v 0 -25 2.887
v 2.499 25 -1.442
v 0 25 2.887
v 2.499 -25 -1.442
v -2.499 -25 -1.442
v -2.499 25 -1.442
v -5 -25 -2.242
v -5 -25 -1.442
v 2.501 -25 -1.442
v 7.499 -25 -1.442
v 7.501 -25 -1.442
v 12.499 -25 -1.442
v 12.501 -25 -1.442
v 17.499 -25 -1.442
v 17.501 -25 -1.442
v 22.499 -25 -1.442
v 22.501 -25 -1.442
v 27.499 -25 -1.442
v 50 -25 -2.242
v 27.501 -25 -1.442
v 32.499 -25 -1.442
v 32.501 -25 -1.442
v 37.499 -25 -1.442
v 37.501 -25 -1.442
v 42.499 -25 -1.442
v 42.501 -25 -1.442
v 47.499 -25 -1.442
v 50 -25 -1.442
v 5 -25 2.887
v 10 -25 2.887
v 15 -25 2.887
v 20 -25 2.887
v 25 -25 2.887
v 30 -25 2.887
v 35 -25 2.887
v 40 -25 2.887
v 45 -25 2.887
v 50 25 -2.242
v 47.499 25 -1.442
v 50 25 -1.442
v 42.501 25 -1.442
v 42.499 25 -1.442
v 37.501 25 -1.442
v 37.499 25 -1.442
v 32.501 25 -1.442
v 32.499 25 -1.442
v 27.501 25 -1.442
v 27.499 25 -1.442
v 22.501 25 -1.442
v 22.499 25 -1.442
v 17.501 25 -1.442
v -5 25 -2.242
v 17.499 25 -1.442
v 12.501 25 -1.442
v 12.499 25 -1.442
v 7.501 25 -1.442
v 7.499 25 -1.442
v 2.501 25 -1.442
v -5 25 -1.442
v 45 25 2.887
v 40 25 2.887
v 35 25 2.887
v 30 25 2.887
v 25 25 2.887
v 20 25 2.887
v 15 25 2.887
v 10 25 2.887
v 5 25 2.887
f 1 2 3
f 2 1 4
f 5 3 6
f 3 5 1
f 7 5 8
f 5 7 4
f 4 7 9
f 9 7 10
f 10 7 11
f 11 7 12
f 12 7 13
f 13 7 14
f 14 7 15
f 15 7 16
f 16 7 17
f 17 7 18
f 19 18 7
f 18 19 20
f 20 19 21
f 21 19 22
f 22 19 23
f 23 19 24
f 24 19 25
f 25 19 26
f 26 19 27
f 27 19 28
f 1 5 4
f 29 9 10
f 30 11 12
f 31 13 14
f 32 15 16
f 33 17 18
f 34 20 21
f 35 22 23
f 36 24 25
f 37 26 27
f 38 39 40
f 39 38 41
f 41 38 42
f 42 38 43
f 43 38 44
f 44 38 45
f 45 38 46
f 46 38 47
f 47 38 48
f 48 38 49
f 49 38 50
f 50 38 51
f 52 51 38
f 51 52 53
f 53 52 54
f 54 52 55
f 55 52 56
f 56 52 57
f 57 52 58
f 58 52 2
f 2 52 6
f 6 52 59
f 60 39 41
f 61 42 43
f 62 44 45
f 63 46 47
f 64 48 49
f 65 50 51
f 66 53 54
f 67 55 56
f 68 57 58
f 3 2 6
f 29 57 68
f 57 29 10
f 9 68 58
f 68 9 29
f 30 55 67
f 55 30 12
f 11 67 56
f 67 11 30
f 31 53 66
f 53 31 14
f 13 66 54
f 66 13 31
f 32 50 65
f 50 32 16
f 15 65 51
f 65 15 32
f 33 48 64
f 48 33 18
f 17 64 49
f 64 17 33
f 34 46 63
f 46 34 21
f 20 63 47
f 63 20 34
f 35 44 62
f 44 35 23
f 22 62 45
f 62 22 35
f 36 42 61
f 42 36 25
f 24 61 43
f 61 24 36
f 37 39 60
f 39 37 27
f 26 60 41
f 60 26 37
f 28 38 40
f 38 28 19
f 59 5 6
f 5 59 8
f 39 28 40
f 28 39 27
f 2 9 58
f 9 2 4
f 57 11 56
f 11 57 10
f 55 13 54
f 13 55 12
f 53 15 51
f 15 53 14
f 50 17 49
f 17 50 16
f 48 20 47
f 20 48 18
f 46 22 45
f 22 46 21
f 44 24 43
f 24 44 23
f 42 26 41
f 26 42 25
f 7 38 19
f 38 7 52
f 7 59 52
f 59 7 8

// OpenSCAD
//
// Lenticular Card Maker by gsyan
//
// 2020.09.07
//
// Pictures(PNG) size : 100x100 pixels
//
// crop the photo to equal parts horizontally (size 10x100)
//					at x axis 0,10,20,30,40,50,60,70,80,90
//
// 	ex.  magick + dos command (crop to 10x100, 10 parts) 
//			replace picture-1.png & picture-2.png  with your filenames
//			output filename numbers 0,10,20,30 ... 90
//
//			for /L %a in (0,10,90) do (magick convert -crop 10x100+%a+0 picture-1.png parts-1-%a.png )
//			for /L %a in (0,10,90) do (magick convert -crop 10x100+%a+0 picture-2.png parts-1-%a.png )
//
// 	ex.  magick + dos command (crop to 5x100, 20 parts)
//			replace picture-1.png & picture-2.png  with your filenames
//			output filename numbers 0, 5,10,15 ... 95
//
//			for /L %a in (0,5,95) do (magick convert -crop 5x100+%a+0 picture-1.png parts-1-%a0.png )
//			for /L %a in (0,5,95) do (magick convert -crop 5x100+%a+0 picture-2.png parts-2-%a0.png )
//
// image filename format : image1_filename_prefix + filename_numbers + filename_postfix
// 		ex. parts-1-0.png , parts-1-10.png, parts-1-20.png ... parts-1-90.png
//

//* [Global] */ 

//
// image size setting
//
image_width = 100; //the width of orginal image in pixel
image_height = 100; //the height of orignal image in pixel

parts_total_number = 10;

prism_orientation = 1; // [0:Horizontal, 1:Vertical]

//
// output options
//
imageSurfaceInvert = false; //Inverts how the color values of imported images are translated into height values. 

export_width = 50;  // x size : unit mm
export_depth = 50; // y size : unit mm

//the height of image relative to prism plane
export_image_max_height = 0.8; // z size : pixel max height : unit mm

base_size_z = 0.8; //the height of base , unit : mm



//
// image files setting
//

image1_filename_prefix = "images/parts-1-";	//filename prefix of the 1st photo
image2_filename_prefix = "images/parts-2-";	//filename prefix of the 2nd photo

//filename_numbers
// the numbers are the cropped location of x or y 
// ex.  0,10,20,....90 
//
filename_numbers = [
    for(i=[0:parts_total_number-1]) 
        let(
            offset=(prism_orientation == 1) ?  image_width/parts_total_number : image_height/parts_total_number,
            start_number=i*offset
        ) 
        start_number
    ];
//filename_numbers = [ for(i=[0:9]) let() i];
//filename_numbers = [0,10,20,30,40,50,60,70,80,90]; //when crop to size 10x100
//filename_numbers = [0,5,10,15,20,25,30,35,40,45,50,55,60,65,70,75,80,85,90,95]; // when crop to size 5x100  

filename_postfix = ".png"; //filename postfix




/* [Hidden] */ //don't touch below this line unless you need to adjust under the hood

image_size_x = (prism_orientation == 1) ? export_width/parts_total_number : export_width; //
image_size_y = (prism_orientation == 1 )? export_depth : export_depth/parts_total_number; 
image_size_z = export_image_max_height;  //


image_scale_x = (prism_orientation == 1) ? parts_total_number/image_width : 1/image_width;
image_scale_y = (prism_orientation == 1) ? 1/image_height : parts_total_number/image_height;

prism_angle = 60;

prism_width = (prism_orientation == 1 ? image_size_x : image_size_y); //the width of the prism
prism_radius = prism_width/2/cos(prism_angle/2); //radius of cylinder(prism)

//move offset of next prism 
prism_x_offset = (prism_orientation == 1 ? prism_width*cos(prism_angle)*2 : 0); 
prism_y_offset = (prism_orientation == 1 ? 0 : prism_width*cos(prism_angle)*2); 

prism_length = (prism_orientation == 1 ? prism_x_offset*image_size_y/image_size_x : prism_y_offset*image_size_x/image_size_y); 

image_offset_x = 0; //(prism_width-image_size_x)/2;

image_offset_z = ( imageSurfaceInvert ?
    (prism_radius*sin(prism_angle/2)+image_size_z-0.001) 
    : 
    (prism_radius*sin(prism_angle/2)-0.0001) );


base_size_x = (prism_orientation == 1 ) ? prism_x_offset*parts_total_number + prism_width : prism_length; //the width of the base
base_size_y = (prism_orientation == 1 ) ? prism_length: prism_y_offset*parts_total_number + prism_width ; //the depth of the base

base_offset_x = (prism_orientation == 1) ? base_size_x/2-prism_width : 0;
base_offset_y = (prism_orientation == 1) ? 0 : base_size_y/2-prism_width;
base_offset_z = prism_radius*sin(prism_angle/2)+base_size_z/2;


union() {
	for(i=[0:(parts_total_number-1)]) {
		//concatenate the image filename
		image_filename_1 = str(image1_filename_prefix, filename_numbers[i] , filename_postfix);
		image_filename_2 = str(image2_filename_prefix, filename_numbers[i] , filename_postfix);
		
		x = (prism_orientation == 1 ? prism_x_offset*i : 0 );
		y = (prism_orientation == 1 ? 0 : prism_y_offset*(parts_total_number-1-i) );

		//rotation angle of every stage
		ax1 =(prism_orientation == 1 ? 0 : prism_angle); 
		ay1 =(prism_orientation == 1 ? prism_angle : 0);
		ax2 =(prism_orientation == 1 ? 0 : prism_angle*-2); 
		ay2 =(prism_orientation == 1 ? prism_angle*-2 : 0);
		az =(prism_orientation == 1 ? 90 : 180);
		
		translate([x,y,0])
		rotate([ax1,ay1,0]) 
		union() {
			//rotate([0,(prism_angle*-2),0])
			rotate([ax2,ay2,0]) 
			union() {
			
			    //add a prism (Cylinder, Yellow)
				rotate([ax1,ay1,0])
					//rotate([0,-90,90]) 
					rotate([0,-90,az]) 
						color("yellow") {
							cylinder(h=prism_length,r1=prism_radius,r2=prism_radius,$fn=(180/prism_angle), center=true);
						}
						
				//the first image
				translate([0, 0, image_offset_z])
					//resize([image_size_x,prism_length,image_size_z]) 
                    //scale([0.1,0.1,image_size_z/100])
                    scale([image_size_x*image_scale_x,image_size_y*image_scale_y,image_size_z/100])
						surface(file=image_filename_1, center=true, invert=imageSurfaceInvert);
	
			};
			
			//the second image
			translate([0, 0, image_offset_z])
				//resize([image_size_x,prism_length,image_size_z])
                //scale([0.1,0.1,image_size_z/100])
                scale([image_size_x*image_scale_x,image_size_y*image_scale_y,image_size_z/100])
					surface(file=image_filename_2, center=true, invert=imageSurfaceInvert);       
			
		};

	}
	//the base (cube, Green)
	color("green") {
        translate([base_offset_x, base_offset_y, base_offset_z*-1+0.001])
			cube(size = [base_size_x,base_size_y,base_size_z], center = true);
	};
}
